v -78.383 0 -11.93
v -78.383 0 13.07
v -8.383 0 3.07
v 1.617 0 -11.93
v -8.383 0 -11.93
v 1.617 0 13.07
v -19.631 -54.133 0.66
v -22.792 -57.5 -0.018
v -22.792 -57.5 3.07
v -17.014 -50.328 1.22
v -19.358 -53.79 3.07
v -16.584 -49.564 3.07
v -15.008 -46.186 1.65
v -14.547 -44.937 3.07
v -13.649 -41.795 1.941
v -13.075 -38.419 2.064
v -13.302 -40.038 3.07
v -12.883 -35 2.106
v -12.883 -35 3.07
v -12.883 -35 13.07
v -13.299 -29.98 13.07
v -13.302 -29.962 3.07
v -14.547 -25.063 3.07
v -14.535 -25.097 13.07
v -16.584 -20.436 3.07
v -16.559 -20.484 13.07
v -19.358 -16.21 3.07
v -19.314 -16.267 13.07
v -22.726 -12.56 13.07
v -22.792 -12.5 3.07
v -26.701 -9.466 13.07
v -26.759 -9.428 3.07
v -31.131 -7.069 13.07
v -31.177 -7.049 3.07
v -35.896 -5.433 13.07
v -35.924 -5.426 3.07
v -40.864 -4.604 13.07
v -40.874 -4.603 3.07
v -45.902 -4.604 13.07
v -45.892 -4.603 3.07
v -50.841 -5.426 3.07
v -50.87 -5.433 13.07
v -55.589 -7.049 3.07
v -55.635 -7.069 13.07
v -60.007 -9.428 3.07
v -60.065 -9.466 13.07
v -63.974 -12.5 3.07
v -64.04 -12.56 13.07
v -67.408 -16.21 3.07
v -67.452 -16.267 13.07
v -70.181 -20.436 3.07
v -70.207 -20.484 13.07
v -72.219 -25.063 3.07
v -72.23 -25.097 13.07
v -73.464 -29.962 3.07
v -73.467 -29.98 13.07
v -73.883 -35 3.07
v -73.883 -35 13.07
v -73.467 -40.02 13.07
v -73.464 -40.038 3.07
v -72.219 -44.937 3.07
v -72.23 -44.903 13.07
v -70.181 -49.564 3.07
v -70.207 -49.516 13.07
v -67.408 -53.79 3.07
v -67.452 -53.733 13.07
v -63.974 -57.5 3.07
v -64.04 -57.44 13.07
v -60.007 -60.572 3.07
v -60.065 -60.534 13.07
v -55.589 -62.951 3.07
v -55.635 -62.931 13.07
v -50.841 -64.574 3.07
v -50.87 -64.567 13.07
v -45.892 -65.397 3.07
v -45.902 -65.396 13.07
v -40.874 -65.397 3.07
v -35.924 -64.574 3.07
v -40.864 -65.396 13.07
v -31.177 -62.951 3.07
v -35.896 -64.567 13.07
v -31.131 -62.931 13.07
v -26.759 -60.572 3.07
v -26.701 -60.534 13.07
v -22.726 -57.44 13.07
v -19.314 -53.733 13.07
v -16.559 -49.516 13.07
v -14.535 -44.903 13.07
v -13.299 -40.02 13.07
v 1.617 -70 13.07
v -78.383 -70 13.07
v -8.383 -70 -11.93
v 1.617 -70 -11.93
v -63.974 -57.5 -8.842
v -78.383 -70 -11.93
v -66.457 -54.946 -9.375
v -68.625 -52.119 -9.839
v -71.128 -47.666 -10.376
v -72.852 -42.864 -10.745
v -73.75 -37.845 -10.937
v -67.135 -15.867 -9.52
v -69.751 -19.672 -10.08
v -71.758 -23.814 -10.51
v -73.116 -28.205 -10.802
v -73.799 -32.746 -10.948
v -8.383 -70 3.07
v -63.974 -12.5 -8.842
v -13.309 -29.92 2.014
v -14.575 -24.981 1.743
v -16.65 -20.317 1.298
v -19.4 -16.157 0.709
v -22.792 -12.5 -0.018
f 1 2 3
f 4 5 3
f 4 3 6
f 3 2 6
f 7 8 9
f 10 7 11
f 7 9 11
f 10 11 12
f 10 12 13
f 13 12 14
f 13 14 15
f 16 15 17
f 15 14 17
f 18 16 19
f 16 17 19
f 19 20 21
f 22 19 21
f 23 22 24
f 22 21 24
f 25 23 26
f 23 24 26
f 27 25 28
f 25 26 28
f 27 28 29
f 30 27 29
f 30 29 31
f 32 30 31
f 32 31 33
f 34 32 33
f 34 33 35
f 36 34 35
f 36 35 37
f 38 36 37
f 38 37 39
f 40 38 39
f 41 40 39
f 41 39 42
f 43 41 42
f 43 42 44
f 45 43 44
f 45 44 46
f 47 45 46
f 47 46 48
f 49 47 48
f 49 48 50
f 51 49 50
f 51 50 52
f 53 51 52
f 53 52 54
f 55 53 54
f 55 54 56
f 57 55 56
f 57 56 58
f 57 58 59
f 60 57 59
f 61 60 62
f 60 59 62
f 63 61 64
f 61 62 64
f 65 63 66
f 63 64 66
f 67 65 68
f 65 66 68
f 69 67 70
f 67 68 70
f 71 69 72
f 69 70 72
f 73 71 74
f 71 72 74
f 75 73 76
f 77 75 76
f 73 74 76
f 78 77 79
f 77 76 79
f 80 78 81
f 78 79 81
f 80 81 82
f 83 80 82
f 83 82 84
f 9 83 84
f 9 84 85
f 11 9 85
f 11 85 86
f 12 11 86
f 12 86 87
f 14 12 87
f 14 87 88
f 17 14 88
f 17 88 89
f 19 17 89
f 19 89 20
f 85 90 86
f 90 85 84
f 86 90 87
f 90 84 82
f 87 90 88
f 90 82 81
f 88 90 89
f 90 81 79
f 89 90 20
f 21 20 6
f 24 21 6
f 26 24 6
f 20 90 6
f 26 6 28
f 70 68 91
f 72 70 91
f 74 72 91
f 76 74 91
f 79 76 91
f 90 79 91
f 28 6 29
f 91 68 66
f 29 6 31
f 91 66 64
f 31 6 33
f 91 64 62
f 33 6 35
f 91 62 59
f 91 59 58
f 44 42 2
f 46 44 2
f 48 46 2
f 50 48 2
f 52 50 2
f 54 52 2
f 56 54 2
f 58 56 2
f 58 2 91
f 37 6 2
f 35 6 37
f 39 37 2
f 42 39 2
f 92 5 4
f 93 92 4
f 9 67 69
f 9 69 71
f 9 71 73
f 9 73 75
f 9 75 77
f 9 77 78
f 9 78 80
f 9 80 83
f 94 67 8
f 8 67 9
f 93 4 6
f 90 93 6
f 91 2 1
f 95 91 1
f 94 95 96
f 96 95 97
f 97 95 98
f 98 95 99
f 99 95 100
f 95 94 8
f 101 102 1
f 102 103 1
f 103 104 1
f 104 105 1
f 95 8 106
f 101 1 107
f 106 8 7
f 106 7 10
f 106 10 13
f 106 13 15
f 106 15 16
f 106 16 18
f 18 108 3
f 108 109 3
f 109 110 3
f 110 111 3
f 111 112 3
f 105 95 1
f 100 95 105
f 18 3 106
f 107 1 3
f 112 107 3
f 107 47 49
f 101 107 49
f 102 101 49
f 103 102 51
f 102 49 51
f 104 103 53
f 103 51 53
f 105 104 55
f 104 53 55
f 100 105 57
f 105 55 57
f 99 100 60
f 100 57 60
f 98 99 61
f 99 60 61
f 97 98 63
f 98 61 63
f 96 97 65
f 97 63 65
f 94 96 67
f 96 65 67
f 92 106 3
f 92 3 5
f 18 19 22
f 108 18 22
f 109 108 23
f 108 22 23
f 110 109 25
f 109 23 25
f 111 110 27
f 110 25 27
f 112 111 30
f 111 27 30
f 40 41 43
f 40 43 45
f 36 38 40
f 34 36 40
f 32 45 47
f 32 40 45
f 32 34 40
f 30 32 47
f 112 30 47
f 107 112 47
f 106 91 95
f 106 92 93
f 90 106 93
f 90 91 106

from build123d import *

# Parameters (mm, degrees)
F1_DEPTH = 70
F2_R     = 30.5
F3_DEPTH = 10
F5_DEPTH = 25


with BuildPart() as f1:
    # F0 (on Front) → F1 (new body)
    with BuildSketch(Plane.XZ):
        Polygon((1.617145, 13.06996), (-78.382855, 13.06996), (-78.382855, -11.93004), (-8.382855, 3.06996), (-8.382855, -11.93004), (1.617145, -11.93004), align=None)
    extrude(amount=F1_DEPTH)

    # F2 (on face) → F3 (cut)
    with BuildSketch(Plane.XY.offset(13.06996)):
        with Locations((-43.382855, -35)):
            Circle(F2_R)
    extrude(amount=-F3_DEPTH, mode=Mode.SUBTRACT)

    # F4 (on face) → F5 (cut)
    with BuildSketch(Plane.XY.offset(3.06996)):
        with BuildLine():
            ThreePointArc((-12.882855, -35), (-15.469745, -22.707389), (-22.791595, -12.5))
            Line((-22.791595, -12.5), (-63.974116, -12.5))
            ThreePointArc((-63.974116, -12.5), (-73.882855, -35), (-63.974116, -57.5))
            Line((-63.974116, -57.5), (-22.791595, -57.5))
            ThreePointArc((-22.791595, -57.5), (-15.469745, -47.292611), (-12.882855, -35))
        make_face()
    extrude(amount=-F5_DEPTH, mode=Mode.SUBTRACT)


solid = f1.part
